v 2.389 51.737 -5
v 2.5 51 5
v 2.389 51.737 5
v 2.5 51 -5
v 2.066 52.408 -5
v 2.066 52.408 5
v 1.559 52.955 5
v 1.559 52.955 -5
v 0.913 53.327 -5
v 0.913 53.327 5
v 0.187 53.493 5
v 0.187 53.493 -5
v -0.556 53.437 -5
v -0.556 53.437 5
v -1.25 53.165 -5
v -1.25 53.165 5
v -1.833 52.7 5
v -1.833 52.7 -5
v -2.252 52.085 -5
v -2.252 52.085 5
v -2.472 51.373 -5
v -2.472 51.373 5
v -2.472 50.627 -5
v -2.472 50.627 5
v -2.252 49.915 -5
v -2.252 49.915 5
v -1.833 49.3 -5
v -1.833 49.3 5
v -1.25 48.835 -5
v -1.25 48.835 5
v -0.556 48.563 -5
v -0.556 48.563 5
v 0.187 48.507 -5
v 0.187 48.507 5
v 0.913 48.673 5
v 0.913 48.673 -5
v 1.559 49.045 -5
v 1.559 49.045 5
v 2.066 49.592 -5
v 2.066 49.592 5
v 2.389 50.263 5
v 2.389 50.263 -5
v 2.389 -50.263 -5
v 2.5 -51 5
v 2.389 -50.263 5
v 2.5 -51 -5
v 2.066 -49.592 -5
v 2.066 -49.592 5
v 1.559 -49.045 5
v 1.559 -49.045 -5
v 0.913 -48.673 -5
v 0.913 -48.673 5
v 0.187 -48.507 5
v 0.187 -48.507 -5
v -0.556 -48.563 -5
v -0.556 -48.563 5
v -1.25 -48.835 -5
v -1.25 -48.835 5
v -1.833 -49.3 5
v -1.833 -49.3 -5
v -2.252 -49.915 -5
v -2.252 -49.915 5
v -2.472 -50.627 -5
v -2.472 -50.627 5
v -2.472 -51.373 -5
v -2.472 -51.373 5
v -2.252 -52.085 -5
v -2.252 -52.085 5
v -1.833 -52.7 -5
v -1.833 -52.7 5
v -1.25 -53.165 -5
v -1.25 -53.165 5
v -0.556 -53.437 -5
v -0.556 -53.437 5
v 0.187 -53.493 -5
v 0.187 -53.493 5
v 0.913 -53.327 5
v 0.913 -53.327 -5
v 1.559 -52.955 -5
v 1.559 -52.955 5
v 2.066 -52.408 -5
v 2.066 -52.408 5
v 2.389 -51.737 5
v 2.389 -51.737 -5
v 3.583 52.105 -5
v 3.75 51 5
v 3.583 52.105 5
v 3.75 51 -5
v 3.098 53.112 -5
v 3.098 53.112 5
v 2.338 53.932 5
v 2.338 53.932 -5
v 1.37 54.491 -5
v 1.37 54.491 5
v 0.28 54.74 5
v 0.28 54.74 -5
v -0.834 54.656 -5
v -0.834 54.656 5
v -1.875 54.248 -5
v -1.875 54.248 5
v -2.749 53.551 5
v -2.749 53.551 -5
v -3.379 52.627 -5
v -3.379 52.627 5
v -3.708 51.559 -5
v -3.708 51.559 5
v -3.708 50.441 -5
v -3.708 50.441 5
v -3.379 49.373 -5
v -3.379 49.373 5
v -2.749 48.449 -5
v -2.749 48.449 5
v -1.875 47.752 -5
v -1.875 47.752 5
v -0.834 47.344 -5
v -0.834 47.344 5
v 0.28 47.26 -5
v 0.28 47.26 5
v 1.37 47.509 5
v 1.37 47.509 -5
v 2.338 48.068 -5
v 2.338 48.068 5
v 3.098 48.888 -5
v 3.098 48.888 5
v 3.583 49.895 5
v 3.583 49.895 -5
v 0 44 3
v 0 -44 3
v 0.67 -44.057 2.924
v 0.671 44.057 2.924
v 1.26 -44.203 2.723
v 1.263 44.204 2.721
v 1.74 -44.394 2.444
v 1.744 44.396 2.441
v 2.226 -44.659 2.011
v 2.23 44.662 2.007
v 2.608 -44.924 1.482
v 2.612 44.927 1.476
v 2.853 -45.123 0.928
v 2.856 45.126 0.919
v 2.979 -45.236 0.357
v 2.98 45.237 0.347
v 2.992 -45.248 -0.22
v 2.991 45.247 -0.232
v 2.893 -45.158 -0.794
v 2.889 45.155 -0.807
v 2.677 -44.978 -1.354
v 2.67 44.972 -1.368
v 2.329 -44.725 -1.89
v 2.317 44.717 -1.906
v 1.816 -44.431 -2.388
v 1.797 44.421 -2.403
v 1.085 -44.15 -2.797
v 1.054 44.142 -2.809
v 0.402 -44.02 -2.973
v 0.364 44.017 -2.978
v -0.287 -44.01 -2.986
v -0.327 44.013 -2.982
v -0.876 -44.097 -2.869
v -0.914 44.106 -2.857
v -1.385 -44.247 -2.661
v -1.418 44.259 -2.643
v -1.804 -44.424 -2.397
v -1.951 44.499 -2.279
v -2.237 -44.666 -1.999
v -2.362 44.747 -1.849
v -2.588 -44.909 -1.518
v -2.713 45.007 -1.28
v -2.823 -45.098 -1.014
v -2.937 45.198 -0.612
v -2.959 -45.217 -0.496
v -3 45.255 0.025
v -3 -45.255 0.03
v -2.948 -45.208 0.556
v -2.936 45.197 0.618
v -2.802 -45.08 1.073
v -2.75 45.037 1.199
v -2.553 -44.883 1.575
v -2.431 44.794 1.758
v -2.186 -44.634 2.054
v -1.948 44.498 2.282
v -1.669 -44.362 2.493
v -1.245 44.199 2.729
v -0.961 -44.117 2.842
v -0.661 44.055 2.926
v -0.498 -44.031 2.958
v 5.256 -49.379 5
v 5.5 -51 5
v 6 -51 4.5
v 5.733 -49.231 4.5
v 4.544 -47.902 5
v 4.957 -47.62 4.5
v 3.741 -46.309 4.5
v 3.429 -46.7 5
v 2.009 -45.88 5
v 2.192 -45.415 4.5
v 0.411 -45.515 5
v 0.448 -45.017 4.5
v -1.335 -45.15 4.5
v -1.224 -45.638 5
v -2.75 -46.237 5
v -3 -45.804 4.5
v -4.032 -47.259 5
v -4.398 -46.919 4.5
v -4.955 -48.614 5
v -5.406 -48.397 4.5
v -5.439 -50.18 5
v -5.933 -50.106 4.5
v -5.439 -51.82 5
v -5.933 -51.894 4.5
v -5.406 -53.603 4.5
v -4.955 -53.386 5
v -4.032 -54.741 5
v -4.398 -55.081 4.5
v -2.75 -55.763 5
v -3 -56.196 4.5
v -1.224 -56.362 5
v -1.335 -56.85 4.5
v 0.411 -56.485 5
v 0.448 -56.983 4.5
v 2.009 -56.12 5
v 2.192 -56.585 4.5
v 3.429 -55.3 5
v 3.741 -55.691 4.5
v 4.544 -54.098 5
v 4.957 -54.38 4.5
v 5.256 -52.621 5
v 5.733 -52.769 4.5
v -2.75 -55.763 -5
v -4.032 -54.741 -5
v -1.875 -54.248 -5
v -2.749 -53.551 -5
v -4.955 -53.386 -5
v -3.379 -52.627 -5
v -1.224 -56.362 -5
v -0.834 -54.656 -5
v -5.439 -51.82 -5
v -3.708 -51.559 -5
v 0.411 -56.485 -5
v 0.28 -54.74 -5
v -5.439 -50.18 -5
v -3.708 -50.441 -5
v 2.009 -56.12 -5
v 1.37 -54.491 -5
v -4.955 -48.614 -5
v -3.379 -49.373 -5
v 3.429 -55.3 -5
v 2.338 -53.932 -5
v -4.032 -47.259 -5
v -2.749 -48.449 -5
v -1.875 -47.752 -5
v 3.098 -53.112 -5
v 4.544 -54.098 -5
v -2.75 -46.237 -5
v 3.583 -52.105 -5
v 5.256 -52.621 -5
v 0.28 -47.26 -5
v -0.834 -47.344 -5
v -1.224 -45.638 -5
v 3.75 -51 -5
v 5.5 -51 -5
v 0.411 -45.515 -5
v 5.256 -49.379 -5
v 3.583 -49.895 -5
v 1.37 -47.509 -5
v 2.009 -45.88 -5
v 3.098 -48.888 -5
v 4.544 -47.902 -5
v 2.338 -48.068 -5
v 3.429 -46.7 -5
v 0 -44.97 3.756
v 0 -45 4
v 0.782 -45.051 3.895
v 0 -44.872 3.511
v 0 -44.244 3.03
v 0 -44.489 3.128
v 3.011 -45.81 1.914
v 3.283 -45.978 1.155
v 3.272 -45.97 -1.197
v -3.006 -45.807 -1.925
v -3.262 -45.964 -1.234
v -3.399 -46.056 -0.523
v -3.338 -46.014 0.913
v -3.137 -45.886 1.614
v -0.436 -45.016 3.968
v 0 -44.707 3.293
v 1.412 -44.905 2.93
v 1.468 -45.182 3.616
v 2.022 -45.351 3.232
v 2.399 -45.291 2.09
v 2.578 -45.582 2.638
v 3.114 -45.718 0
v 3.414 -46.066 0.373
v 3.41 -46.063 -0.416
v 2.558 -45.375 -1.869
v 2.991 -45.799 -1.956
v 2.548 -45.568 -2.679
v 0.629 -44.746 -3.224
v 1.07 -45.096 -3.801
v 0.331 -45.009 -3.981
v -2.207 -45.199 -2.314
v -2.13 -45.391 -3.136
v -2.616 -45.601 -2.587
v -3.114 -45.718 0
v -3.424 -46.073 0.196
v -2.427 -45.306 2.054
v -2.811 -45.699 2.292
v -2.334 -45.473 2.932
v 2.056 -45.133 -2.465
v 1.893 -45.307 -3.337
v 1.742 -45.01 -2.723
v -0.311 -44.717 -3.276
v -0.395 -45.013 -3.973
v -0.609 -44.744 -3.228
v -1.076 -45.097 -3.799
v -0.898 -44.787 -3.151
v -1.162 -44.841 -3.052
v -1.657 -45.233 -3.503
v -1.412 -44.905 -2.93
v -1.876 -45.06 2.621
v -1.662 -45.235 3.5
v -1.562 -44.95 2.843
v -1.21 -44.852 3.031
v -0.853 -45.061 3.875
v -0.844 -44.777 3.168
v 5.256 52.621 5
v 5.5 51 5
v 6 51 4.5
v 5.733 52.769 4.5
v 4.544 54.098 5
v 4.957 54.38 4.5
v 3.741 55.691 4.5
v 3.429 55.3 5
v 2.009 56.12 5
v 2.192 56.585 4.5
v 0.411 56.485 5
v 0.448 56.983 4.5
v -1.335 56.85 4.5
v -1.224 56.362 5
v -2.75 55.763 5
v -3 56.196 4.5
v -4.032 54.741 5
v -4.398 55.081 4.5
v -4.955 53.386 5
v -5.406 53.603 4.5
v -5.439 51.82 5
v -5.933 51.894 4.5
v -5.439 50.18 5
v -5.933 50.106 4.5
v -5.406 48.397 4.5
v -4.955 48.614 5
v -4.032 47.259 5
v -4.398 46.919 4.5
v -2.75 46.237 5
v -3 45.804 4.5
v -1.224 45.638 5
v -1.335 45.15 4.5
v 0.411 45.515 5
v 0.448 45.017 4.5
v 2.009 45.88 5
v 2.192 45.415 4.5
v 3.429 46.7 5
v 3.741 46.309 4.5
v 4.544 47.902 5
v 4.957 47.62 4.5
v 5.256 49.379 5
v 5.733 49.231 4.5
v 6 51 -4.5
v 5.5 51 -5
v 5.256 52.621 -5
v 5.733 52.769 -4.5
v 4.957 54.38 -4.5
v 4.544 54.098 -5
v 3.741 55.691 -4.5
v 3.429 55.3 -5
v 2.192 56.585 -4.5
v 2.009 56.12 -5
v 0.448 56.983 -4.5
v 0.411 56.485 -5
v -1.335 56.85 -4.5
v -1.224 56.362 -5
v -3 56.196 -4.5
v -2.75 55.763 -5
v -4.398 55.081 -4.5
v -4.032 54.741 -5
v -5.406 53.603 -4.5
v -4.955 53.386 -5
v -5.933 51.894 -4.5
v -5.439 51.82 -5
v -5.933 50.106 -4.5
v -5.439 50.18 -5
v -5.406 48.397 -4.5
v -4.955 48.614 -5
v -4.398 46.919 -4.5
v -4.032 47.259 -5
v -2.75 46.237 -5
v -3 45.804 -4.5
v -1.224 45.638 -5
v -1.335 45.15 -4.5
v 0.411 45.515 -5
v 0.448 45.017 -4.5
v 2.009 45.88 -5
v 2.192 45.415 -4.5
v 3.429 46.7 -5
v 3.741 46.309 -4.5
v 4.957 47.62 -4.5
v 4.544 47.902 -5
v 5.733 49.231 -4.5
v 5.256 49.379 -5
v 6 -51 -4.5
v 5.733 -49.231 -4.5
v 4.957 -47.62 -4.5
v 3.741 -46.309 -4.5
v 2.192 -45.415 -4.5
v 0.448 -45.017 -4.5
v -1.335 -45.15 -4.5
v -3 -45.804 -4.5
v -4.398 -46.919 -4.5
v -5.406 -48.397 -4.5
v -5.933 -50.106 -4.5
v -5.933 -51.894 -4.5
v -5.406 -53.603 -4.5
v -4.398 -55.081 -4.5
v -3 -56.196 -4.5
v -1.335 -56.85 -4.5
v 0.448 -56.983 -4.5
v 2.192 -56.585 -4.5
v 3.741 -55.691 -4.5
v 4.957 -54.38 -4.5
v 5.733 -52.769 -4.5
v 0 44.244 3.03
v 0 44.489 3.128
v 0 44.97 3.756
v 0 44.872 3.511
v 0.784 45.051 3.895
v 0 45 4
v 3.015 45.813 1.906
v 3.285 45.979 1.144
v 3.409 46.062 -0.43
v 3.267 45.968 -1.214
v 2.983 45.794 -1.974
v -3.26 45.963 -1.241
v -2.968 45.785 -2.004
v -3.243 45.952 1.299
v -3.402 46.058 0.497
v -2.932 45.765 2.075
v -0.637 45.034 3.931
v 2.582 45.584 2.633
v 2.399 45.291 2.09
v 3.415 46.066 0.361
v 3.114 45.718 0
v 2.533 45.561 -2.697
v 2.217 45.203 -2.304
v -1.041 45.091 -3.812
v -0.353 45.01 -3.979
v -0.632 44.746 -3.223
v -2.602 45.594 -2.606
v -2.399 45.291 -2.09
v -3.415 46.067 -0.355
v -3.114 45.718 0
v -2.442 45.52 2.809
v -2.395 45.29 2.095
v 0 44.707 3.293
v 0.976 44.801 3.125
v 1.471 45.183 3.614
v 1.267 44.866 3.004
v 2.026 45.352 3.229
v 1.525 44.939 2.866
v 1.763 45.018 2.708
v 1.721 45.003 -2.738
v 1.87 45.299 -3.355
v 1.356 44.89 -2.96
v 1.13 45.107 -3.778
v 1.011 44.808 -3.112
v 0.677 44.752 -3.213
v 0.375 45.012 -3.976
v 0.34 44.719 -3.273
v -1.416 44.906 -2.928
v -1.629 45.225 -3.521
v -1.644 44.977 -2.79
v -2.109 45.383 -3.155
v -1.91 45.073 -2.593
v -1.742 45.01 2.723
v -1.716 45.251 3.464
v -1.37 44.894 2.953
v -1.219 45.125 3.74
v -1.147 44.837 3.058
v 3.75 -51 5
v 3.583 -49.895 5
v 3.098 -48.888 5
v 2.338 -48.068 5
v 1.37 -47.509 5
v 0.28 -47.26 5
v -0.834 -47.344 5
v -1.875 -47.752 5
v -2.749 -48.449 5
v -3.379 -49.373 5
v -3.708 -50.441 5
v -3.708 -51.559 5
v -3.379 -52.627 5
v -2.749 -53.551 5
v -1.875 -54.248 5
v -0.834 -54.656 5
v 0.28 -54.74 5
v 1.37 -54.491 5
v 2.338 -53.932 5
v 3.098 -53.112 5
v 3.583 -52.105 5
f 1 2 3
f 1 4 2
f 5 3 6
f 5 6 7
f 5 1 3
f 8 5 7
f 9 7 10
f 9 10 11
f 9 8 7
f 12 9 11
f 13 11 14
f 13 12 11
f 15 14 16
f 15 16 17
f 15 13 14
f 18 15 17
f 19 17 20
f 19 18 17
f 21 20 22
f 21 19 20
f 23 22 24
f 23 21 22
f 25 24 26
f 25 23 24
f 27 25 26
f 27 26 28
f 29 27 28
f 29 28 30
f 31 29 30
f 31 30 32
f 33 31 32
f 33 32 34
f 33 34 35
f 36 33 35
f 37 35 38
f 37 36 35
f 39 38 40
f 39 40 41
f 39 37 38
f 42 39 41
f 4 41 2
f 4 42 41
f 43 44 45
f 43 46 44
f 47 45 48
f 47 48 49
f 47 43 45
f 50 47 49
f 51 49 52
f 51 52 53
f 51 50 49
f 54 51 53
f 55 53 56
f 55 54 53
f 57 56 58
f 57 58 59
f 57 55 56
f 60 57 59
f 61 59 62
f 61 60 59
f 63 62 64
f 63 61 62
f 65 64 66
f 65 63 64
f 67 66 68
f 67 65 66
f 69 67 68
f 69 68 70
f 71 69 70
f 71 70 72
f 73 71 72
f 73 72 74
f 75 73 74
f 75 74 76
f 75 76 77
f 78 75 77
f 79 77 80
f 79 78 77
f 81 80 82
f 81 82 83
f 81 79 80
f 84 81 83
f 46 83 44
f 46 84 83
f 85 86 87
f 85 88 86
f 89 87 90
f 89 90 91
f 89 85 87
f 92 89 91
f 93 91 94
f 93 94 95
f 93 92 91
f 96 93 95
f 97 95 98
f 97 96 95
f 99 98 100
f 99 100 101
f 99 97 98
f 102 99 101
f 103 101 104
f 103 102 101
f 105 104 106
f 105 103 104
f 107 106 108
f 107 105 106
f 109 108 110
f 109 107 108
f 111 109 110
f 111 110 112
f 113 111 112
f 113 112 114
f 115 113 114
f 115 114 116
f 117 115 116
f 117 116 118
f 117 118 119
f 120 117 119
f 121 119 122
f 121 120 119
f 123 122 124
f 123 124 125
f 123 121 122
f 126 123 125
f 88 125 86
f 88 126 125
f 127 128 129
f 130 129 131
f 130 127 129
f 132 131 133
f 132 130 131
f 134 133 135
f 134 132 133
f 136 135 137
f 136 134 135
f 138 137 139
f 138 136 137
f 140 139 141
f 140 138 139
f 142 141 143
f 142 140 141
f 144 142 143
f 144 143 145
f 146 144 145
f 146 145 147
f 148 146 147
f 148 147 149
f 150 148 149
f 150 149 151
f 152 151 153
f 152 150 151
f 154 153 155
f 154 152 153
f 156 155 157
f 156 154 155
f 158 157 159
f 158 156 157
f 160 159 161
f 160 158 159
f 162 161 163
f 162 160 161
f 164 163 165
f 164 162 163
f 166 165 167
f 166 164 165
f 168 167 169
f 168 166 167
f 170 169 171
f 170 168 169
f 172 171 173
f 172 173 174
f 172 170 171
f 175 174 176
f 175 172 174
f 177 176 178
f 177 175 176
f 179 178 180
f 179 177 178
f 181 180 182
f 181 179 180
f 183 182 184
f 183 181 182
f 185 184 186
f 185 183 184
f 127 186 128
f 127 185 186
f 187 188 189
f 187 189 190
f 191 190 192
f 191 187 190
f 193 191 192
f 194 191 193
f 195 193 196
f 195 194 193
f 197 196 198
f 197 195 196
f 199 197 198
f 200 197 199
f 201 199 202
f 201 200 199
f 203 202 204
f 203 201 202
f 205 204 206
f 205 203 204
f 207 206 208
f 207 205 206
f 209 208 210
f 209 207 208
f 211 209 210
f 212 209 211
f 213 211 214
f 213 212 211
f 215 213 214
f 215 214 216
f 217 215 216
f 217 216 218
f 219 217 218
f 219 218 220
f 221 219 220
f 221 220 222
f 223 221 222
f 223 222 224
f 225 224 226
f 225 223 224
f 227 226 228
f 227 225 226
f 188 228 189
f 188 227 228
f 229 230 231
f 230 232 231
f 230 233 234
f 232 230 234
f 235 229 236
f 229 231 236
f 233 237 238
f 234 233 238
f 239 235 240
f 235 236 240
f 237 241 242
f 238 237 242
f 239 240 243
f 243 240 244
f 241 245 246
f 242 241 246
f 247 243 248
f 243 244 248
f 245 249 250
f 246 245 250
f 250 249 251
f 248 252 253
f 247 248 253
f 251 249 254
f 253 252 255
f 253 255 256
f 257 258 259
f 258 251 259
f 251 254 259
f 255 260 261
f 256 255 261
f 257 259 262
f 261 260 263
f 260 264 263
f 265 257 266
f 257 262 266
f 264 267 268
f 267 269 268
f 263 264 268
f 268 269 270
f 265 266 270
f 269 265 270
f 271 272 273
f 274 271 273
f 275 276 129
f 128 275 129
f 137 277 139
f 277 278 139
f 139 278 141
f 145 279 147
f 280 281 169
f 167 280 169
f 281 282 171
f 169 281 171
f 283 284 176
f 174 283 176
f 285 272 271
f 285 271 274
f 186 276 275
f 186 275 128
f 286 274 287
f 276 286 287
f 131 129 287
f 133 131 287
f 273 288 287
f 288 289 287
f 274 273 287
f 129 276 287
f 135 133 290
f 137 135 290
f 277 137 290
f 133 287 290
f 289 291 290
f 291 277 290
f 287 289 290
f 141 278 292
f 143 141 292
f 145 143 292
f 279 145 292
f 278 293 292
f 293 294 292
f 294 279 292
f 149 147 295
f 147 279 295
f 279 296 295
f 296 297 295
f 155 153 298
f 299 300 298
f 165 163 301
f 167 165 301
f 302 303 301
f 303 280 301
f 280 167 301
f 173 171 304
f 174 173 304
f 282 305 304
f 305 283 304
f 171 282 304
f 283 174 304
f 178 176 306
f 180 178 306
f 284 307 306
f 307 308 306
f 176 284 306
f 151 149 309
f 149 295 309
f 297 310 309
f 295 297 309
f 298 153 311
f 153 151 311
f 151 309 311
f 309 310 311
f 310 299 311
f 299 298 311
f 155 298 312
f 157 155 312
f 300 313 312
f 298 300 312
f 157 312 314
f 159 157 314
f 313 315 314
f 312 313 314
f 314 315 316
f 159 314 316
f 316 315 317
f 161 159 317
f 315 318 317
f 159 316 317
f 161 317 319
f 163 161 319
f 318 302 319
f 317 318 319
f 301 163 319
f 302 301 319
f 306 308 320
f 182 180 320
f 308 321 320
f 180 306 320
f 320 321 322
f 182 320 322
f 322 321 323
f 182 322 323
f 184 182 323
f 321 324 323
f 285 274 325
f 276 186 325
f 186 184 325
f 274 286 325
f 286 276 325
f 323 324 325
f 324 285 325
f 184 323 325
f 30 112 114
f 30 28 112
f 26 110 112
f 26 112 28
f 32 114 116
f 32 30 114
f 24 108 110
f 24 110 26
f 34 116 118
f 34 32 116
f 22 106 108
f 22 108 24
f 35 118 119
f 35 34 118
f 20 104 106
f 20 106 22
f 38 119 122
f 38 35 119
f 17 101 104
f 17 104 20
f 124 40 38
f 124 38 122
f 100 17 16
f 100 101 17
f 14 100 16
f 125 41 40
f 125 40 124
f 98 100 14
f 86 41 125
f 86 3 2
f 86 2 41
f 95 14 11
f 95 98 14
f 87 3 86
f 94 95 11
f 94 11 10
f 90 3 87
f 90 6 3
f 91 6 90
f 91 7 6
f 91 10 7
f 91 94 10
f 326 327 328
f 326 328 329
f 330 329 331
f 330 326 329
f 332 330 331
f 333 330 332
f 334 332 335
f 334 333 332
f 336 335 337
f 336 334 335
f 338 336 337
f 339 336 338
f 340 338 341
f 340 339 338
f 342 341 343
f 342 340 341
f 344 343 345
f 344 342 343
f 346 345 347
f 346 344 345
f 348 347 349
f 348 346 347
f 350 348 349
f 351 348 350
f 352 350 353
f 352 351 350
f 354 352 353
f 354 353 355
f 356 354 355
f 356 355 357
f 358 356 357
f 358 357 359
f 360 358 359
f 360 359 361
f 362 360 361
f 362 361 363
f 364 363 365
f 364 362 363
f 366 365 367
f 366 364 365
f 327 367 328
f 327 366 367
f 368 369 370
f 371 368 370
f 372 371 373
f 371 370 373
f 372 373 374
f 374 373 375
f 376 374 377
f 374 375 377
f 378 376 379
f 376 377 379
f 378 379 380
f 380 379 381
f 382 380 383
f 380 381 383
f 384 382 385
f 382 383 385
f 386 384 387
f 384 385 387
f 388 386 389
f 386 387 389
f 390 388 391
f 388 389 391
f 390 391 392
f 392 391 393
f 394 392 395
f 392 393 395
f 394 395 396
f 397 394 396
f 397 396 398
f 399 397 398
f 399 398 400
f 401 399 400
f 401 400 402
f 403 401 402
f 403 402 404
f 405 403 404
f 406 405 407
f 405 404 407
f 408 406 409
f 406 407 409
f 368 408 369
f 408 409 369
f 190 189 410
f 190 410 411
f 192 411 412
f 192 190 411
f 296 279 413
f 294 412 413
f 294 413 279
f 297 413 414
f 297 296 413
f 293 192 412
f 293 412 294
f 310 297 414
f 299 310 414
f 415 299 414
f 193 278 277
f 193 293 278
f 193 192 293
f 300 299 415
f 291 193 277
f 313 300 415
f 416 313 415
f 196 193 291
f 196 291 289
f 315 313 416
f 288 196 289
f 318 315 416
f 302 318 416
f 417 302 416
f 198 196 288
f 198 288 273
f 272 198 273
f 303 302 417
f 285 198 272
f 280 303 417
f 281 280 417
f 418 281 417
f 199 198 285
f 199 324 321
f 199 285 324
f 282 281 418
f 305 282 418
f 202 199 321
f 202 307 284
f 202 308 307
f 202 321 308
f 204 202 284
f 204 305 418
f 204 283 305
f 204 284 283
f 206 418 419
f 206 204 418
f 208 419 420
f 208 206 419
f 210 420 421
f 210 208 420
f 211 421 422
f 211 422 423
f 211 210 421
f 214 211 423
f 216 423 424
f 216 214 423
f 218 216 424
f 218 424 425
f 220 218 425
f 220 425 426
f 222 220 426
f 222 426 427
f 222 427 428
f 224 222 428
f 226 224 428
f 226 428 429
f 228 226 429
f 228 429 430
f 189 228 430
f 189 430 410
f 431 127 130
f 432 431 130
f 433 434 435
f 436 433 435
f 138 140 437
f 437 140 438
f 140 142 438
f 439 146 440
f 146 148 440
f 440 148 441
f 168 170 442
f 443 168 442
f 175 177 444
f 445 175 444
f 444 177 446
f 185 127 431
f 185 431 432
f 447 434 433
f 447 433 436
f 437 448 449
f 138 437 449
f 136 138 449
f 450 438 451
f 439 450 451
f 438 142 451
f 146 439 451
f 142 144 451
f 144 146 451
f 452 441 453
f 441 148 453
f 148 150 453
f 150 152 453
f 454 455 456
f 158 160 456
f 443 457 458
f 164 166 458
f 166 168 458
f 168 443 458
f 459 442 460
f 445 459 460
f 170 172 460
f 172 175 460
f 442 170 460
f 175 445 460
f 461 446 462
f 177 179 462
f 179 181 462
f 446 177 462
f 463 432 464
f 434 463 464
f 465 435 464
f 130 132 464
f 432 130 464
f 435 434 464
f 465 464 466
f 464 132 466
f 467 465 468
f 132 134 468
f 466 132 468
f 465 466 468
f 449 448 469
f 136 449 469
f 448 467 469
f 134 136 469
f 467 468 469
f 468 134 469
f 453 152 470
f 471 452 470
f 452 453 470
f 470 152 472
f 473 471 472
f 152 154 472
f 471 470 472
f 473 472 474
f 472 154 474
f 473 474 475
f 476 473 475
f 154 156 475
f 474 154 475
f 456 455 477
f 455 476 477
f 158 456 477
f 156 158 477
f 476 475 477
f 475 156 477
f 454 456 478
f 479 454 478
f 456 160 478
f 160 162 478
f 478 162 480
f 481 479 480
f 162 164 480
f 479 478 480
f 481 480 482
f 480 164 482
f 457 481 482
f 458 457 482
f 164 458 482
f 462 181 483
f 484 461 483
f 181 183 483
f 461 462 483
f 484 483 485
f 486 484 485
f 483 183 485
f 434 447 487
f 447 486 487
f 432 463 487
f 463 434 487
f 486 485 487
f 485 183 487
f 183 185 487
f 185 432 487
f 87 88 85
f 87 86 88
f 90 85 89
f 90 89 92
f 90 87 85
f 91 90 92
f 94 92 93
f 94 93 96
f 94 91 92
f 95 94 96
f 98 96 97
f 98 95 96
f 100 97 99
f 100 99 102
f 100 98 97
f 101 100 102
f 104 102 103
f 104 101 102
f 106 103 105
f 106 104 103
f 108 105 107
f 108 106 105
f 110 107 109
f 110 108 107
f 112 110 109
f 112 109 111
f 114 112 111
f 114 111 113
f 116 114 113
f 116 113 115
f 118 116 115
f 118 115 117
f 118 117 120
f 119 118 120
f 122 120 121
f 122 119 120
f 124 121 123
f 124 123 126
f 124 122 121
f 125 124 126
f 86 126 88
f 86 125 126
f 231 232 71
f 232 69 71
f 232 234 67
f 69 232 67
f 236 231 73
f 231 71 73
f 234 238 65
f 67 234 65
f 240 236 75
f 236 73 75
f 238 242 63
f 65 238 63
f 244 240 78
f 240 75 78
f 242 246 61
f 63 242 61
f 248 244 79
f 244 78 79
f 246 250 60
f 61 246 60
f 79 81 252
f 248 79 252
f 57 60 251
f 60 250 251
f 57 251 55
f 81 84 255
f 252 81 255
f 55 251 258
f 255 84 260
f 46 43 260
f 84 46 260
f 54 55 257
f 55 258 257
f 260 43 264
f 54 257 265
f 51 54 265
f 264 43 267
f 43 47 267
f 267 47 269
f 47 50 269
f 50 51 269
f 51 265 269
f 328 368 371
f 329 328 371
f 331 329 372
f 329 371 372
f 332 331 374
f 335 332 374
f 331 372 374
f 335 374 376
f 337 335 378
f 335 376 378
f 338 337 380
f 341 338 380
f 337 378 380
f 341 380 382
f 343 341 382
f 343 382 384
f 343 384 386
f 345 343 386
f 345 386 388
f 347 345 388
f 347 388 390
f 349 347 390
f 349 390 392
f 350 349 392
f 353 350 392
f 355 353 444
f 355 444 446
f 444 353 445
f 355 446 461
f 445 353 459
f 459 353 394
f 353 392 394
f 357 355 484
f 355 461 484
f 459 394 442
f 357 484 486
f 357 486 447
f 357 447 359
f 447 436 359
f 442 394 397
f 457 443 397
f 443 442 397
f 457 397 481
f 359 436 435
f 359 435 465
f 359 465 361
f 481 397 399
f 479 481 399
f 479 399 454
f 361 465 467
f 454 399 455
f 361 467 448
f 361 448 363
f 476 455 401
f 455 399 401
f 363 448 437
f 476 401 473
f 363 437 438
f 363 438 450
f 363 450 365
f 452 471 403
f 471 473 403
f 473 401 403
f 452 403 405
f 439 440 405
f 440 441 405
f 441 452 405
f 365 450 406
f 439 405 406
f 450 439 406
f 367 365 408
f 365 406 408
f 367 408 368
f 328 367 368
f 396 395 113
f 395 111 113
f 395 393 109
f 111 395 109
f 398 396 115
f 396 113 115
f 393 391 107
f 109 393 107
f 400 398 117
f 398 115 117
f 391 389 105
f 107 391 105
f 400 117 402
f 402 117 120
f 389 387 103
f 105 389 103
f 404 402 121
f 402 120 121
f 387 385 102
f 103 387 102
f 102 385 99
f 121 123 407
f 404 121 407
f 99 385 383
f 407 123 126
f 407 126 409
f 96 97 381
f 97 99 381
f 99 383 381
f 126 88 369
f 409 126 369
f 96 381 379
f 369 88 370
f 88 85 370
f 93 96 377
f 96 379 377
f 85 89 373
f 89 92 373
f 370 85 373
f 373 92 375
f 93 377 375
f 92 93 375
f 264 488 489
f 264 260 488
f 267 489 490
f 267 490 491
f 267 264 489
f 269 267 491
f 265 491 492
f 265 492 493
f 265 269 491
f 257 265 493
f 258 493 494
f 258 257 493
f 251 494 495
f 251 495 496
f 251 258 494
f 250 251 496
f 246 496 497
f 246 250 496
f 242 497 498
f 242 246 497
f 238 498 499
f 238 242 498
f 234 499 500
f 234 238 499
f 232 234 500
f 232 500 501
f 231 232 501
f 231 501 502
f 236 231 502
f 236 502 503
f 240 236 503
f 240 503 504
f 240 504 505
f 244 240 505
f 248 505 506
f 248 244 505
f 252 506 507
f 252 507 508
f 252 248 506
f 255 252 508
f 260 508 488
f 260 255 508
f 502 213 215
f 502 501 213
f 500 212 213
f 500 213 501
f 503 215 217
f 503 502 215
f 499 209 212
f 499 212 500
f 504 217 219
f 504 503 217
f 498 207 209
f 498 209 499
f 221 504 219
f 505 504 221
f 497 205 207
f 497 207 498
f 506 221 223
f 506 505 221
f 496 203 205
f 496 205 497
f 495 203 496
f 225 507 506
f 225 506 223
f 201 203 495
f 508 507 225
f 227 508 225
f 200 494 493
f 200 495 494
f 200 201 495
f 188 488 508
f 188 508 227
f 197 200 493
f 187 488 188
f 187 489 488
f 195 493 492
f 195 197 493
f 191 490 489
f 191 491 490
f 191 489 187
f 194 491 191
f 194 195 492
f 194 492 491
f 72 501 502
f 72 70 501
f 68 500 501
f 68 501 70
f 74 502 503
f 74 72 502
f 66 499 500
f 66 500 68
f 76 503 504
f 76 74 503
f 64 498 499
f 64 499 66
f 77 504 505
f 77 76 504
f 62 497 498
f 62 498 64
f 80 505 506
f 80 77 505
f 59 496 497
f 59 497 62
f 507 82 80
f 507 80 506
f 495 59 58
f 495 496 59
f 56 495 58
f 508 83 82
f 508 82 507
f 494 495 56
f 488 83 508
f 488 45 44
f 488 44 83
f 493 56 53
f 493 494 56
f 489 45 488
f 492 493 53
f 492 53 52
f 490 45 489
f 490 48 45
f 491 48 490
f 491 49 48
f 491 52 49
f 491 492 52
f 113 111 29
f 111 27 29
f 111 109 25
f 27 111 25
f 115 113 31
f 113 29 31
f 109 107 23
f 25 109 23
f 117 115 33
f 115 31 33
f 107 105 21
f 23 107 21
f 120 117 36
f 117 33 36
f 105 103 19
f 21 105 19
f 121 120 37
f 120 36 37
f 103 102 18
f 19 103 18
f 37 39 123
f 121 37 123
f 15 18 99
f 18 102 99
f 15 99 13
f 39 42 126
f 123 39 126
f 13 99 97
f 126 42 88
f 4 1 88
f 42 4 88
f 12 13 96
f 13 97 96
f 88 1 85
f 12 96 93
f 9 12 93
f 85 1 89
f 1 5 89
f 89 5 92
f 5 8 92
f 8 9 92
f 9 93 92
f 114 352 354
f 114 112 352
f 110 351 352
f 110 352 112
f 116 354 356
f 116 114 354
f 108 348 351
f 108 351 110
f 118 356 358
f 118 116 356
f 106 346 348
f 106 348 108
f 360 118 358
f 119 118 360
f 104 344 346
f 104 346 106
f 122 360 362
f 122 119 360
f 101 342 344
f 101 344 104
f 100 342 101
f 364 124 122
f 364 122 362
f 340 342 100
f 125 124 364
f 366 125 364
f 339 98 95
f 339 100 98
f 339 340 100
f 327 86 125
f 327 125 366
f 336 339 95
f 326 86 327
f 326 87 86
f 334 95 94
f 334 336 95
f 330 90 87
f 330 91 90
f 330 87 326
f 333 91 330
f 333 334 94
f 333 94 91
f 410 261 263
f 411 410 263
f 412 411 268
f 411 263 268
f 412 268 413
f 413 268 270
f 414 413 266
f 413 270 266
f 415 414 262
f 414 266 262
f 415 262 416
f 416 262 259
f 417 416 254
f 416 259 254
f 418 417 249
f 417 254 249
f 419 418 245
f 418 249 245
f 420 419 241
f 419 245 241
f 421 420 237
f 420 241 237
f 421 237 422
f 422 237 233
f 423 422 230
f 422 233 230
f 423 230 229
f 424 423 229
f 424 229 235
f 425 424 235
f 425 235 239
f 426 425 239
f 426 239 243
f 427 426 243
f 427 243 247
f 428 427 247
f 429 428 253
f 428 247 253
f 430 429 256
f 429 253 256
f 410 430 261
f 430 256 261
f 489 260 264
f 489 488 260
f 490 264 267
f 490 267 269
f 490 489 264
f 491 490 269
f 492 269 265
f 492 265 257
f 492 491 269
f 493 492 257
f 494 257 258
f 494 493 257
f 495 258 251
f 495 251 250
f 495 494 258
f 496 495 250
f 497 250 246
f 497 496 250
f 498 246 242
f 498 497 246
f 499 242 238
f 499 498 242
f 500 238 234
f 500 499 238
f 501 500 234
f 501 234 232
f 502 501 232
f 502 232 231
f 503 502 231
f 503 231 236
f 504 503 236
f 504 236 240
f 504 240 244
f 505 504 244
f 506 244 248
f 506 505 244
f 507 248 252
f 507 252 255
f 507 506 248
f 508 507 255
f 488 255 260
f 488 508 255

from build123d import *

# Parameters (mm, degrees)
SKETCH1_R             = 3
BOSS_EXTRUDE1_DEPTH   = 46
SKETCH2_R             = 6
SKETCH2_R_2           = 3.75
BOSS_EXTRUDE2_DEPTH   = 5
SKETCH3_R             = 3.75
SKETCH3_R_2           = 2.5
BOSS_EXTRUDE3_DEPTH   = 5
BOSS_EXTRUDE3_2_DEPTH = 5
FILLET1_R             = 1
CHAMFER2_SIZE         = 0.5


with BuildPart() as part:
    # Sketch1 → Boss-Extrude1 (new, symmetric)
    with BuildSketch(Plane(origin=(0, 0, 0), x_dir=(1, 0, 0), z_dir=(0, 1, 0))):
        with Locations(Location((0, 0, 0), (0, 0, 270))):
            Circle(SKETCH1_R)
    extrude(amount=BOSS_EXTRUDE1_DEPTH, both=True)

    # Sketch2 → Boss-Extrude2 (add, symmetric)
    # profile 1 of 2: a face of its own
    with BuildSketch(Plane.XY):
        with Locations((0, 51)):
            Circle(SKETCH2_R)
        with Locations((0, 51)):
            Circle(SKETCH2_R_2, mode=Mode.SUBTRACT)
    # profile 2 of 2: a face of its own
    with BuildSketch(Plane.XY):
        with Locations((0, -51)):
            Circle(SKETCH2_R)
        with Locations((0, -51)):
            Circle(SKETCH2_R_2, mode=Mode.SUBTRACT)
    extrude(amount=BOSS_EXTRUDE2_DEPTH, both=True)

    # Fillet1
    fillet1_edges = [part.edges().sort_by_distance(p)[0] for p in [
        (0, -45, -3.000000001),
        (0, 45, -3.000000001),
    ]]
    fillet(fillet1_edges, radius=FILLET1_R)

    # Chamfer2
    chamfer2_edges = [part.edges().sort_by_distance(p)[0] for p in [
        (-6, -51, -5),
        (-6, -51, 5),
        (-6, 51, -5),
        (-6, 51, 5),
    ]]
    chamfer(chamfer2_edges, length=CHAMFER2_SIZE)


with BuildPart() as body_2:
    # Sketch3 → Boss-Extrude3 (new, symmetric)
    with BuildSketch(Plane.XY):
        with Locations((0, 51)):
            Circle(SKETCH3_R)
        with Locations((0, 51)):
            Circle(SKETCH3_R_2, mode=Mode.SUBTRACT)
    extrude(amount=BOSS_EXTRUDE3_DEPTH, both=True)


with BuildPart() as body_3:
    # Sketch3 → Boss-Extrude3 2 (new, symmetric)
    with BuildSketch(Plane.XY):
        with Locations((0, -51)):
            Circle(SKETCH3_R)
        with Locations((0, -51)):
            Circle(SKETCH3_R_2, mode=Mode.SUBTRACT)
    extrude(amount=BOSS_EXTRUDE3_2_DEPTH, both=True)


solid = Compound([part.part, body_2.part, body_3.part])
